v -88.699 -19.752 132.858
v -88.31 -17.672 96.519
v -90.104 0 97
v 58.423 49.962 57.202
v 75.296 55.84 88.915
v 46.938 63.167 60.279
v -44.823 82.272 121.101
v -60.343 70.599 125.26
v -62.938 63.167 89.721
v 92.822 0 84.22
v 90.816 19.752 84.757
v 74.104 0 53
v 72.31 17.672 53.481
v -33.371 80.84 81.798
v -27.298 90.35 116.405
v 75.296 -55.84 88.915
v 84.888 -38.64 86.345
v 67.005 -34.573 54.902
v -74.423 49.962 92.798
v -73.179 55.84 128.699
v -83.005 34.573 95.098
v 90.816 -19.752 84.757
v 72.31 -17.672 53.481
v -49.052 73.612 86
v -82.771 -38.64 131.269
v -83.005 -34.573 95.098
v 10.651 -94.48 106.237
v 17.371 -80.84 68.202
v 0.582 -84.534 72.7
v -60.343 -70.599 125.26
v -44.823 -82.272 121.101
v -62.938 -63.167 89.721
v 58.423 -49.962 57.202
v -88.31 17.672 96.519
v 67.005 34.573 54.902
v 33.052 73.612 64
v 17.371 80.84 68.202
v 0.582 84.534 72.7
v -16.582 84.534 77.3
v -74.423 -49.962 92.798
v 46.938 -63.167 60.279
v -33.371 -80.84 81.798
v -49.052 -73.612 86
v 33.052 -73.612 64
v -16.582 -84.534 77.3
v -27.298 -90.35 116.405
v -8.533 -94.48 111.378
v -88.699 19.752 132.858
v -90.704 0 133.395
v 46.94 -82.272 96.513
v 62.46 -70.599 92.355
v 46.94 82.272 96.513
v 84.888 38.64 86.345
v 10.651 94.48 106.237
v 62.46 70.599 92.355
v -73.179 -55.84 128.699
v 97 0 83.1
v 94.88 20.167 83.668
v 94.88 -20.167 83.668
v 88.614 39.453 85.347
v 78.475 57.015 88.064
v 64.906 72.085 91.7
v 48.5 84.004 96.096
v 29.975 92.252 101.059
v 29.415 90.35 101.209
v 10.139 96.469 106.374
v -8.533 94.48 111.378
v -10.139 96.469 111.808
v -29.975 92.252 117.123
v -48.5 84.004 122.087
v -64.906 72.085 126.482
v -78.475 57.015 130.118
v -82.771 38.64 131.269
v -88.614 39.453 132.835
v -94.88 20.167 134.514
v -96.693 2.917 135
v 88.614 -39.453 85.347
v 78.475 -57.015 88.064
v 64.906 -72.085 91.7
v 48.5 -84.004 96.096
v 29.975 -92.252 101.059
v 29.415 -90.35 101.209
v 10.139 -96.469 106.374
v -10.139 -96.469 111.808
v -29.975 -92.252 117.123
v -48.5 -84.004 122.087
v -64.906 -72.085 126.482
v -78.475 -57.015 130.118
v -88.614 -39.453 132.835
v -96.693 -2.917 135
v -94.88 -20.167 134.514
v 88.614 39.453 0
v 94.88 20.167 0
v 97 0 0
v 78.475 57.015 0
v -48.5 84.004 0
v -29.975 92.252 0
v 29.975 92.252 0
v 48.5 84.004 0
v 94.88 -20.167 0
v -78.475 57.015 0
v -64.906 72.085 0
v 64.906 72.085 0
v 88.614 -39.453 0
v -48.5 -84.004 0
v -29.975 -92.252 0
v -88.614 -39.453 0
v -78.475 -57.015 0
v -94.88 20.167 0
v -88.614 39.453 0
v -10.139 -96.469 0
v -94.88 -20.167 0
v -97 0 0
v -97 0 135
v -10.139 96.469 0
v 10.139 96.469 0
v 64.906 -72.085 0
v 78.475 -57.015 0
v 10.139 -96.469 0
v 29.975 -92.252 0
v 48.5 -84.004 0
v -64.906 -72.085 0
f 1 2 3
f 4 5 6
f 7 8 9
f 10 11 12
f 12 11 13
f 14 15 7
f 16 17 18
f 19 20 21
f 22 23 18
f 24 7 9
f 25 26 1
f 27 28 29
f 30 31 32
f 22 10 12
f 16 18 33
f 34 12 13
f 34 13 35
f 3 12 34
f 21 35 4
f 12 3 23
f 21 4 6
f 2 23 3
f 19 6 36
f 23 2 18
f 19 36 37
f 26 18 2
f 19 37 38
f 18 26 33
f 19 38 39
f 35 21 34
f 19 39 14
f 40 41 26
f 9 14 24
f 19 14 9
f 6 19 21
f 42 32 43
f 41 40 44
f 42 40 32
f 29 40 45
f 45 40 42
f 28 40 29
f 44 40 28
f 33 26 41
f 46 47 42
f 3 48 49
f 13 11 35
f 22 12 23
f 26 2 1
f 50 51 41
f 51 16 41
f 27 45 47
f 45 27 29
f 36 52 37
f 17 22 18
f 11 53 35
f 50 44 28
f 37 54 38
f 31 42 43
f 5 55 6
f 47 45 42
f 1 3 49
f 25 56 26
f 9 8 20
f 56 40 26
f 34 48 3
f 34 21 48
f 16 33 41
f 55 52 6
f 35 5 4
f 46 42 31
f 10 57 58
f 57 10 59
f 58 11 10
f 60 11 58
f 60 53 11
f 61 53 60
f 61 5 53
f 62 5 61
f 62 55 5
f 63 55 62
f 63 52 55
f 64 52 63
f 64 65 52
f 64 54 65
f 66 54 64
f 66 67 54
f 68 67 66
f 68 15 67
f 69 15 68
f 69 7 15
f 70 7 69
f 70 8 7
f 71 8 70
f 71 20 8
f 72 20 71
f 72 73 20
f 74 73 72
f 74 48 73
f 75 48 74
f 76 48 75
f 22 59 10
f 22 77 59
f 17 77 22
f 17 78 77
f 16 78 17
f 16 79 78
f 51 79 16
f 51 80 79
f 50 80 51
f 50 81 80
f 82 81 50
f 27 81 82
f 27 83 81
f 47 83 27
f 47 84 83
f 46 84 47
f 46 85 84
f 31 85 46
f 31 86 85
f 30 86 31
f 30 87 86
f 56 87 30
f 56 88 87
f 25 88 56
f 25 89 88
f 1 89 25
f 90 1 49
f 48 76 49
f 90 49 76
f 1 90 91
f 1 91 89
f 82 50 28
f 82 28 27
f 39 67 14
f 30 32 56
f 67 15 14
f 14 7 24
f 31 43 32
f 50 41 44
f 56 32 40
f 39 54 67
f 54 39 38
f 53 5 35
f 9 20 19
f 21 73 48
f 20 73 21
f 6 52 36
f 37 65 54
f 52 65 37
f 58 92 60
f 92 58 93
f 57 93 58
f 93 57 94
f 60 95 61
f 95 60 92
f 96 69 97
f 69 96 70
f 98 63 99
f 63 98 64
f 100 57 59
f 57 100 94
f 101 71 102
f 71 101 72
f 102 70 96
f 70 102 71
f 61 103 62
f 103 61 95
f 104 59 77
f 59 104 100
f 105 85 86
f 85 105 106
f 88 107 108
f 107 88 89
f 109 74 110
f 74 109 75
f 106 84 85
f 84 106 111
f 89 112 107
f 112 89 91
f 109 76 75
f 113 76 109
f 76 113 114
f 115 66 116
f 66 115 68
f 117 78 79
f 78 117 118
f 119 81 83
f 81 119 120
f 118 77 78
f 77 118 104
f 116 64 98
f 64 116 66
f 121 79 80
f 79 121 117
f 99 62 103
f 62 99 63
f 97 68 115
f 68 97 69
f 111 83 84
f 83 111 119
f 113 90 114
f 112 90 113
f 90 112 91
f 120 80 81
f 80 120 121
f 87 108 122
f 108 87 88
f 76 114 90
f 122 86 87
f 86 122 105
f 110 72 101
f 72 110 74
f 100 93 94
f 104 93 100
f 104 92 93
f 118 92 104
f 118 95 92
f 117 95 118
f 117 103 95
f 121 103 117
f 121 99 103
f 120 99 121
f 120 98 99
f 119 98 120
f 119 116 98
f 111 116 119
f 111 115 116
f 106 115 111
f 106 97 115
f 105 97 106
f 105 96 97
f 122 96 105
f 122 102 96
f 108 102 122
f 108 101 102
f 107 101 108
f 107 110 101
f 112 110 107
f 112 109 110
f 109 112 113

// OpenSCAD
bowlTopRadius = 95;
bowlBottomRadius = 85;
bowlHeight = 35;
bowlTilt = 15;

elevationHeight = 50;
height = bowlHeight + elevationHeight;
topRadius = bowlTopRadius + 2;
cutRadius = topRadius + 50;

offset = 8;

module mainPart() {
    difference(){
        translate([offset, 0, 0]) { 
            cylinder(height, topRadius, topRadius); 
        };
        translate([0, 0, elevationHeight / 2]) {
            rotate([0, bowlTilt, 0]) {
                cylinder(bowlHeight, bowlBottomRadius, bowlTopRadius);
                translate([0, 0, bowlHeight]) {
                   cylinder(height, cutRadius, cutRadius); 
                }
            };
        };
    }
};

aditionalHeight = 50;

module secondaryPart() {
    cylinder(aditionalHeight,topRadius, topRadius);
};
translate([-offset,0, aditionalHeight]) {
    mainPart();
};
secondaryPart();
